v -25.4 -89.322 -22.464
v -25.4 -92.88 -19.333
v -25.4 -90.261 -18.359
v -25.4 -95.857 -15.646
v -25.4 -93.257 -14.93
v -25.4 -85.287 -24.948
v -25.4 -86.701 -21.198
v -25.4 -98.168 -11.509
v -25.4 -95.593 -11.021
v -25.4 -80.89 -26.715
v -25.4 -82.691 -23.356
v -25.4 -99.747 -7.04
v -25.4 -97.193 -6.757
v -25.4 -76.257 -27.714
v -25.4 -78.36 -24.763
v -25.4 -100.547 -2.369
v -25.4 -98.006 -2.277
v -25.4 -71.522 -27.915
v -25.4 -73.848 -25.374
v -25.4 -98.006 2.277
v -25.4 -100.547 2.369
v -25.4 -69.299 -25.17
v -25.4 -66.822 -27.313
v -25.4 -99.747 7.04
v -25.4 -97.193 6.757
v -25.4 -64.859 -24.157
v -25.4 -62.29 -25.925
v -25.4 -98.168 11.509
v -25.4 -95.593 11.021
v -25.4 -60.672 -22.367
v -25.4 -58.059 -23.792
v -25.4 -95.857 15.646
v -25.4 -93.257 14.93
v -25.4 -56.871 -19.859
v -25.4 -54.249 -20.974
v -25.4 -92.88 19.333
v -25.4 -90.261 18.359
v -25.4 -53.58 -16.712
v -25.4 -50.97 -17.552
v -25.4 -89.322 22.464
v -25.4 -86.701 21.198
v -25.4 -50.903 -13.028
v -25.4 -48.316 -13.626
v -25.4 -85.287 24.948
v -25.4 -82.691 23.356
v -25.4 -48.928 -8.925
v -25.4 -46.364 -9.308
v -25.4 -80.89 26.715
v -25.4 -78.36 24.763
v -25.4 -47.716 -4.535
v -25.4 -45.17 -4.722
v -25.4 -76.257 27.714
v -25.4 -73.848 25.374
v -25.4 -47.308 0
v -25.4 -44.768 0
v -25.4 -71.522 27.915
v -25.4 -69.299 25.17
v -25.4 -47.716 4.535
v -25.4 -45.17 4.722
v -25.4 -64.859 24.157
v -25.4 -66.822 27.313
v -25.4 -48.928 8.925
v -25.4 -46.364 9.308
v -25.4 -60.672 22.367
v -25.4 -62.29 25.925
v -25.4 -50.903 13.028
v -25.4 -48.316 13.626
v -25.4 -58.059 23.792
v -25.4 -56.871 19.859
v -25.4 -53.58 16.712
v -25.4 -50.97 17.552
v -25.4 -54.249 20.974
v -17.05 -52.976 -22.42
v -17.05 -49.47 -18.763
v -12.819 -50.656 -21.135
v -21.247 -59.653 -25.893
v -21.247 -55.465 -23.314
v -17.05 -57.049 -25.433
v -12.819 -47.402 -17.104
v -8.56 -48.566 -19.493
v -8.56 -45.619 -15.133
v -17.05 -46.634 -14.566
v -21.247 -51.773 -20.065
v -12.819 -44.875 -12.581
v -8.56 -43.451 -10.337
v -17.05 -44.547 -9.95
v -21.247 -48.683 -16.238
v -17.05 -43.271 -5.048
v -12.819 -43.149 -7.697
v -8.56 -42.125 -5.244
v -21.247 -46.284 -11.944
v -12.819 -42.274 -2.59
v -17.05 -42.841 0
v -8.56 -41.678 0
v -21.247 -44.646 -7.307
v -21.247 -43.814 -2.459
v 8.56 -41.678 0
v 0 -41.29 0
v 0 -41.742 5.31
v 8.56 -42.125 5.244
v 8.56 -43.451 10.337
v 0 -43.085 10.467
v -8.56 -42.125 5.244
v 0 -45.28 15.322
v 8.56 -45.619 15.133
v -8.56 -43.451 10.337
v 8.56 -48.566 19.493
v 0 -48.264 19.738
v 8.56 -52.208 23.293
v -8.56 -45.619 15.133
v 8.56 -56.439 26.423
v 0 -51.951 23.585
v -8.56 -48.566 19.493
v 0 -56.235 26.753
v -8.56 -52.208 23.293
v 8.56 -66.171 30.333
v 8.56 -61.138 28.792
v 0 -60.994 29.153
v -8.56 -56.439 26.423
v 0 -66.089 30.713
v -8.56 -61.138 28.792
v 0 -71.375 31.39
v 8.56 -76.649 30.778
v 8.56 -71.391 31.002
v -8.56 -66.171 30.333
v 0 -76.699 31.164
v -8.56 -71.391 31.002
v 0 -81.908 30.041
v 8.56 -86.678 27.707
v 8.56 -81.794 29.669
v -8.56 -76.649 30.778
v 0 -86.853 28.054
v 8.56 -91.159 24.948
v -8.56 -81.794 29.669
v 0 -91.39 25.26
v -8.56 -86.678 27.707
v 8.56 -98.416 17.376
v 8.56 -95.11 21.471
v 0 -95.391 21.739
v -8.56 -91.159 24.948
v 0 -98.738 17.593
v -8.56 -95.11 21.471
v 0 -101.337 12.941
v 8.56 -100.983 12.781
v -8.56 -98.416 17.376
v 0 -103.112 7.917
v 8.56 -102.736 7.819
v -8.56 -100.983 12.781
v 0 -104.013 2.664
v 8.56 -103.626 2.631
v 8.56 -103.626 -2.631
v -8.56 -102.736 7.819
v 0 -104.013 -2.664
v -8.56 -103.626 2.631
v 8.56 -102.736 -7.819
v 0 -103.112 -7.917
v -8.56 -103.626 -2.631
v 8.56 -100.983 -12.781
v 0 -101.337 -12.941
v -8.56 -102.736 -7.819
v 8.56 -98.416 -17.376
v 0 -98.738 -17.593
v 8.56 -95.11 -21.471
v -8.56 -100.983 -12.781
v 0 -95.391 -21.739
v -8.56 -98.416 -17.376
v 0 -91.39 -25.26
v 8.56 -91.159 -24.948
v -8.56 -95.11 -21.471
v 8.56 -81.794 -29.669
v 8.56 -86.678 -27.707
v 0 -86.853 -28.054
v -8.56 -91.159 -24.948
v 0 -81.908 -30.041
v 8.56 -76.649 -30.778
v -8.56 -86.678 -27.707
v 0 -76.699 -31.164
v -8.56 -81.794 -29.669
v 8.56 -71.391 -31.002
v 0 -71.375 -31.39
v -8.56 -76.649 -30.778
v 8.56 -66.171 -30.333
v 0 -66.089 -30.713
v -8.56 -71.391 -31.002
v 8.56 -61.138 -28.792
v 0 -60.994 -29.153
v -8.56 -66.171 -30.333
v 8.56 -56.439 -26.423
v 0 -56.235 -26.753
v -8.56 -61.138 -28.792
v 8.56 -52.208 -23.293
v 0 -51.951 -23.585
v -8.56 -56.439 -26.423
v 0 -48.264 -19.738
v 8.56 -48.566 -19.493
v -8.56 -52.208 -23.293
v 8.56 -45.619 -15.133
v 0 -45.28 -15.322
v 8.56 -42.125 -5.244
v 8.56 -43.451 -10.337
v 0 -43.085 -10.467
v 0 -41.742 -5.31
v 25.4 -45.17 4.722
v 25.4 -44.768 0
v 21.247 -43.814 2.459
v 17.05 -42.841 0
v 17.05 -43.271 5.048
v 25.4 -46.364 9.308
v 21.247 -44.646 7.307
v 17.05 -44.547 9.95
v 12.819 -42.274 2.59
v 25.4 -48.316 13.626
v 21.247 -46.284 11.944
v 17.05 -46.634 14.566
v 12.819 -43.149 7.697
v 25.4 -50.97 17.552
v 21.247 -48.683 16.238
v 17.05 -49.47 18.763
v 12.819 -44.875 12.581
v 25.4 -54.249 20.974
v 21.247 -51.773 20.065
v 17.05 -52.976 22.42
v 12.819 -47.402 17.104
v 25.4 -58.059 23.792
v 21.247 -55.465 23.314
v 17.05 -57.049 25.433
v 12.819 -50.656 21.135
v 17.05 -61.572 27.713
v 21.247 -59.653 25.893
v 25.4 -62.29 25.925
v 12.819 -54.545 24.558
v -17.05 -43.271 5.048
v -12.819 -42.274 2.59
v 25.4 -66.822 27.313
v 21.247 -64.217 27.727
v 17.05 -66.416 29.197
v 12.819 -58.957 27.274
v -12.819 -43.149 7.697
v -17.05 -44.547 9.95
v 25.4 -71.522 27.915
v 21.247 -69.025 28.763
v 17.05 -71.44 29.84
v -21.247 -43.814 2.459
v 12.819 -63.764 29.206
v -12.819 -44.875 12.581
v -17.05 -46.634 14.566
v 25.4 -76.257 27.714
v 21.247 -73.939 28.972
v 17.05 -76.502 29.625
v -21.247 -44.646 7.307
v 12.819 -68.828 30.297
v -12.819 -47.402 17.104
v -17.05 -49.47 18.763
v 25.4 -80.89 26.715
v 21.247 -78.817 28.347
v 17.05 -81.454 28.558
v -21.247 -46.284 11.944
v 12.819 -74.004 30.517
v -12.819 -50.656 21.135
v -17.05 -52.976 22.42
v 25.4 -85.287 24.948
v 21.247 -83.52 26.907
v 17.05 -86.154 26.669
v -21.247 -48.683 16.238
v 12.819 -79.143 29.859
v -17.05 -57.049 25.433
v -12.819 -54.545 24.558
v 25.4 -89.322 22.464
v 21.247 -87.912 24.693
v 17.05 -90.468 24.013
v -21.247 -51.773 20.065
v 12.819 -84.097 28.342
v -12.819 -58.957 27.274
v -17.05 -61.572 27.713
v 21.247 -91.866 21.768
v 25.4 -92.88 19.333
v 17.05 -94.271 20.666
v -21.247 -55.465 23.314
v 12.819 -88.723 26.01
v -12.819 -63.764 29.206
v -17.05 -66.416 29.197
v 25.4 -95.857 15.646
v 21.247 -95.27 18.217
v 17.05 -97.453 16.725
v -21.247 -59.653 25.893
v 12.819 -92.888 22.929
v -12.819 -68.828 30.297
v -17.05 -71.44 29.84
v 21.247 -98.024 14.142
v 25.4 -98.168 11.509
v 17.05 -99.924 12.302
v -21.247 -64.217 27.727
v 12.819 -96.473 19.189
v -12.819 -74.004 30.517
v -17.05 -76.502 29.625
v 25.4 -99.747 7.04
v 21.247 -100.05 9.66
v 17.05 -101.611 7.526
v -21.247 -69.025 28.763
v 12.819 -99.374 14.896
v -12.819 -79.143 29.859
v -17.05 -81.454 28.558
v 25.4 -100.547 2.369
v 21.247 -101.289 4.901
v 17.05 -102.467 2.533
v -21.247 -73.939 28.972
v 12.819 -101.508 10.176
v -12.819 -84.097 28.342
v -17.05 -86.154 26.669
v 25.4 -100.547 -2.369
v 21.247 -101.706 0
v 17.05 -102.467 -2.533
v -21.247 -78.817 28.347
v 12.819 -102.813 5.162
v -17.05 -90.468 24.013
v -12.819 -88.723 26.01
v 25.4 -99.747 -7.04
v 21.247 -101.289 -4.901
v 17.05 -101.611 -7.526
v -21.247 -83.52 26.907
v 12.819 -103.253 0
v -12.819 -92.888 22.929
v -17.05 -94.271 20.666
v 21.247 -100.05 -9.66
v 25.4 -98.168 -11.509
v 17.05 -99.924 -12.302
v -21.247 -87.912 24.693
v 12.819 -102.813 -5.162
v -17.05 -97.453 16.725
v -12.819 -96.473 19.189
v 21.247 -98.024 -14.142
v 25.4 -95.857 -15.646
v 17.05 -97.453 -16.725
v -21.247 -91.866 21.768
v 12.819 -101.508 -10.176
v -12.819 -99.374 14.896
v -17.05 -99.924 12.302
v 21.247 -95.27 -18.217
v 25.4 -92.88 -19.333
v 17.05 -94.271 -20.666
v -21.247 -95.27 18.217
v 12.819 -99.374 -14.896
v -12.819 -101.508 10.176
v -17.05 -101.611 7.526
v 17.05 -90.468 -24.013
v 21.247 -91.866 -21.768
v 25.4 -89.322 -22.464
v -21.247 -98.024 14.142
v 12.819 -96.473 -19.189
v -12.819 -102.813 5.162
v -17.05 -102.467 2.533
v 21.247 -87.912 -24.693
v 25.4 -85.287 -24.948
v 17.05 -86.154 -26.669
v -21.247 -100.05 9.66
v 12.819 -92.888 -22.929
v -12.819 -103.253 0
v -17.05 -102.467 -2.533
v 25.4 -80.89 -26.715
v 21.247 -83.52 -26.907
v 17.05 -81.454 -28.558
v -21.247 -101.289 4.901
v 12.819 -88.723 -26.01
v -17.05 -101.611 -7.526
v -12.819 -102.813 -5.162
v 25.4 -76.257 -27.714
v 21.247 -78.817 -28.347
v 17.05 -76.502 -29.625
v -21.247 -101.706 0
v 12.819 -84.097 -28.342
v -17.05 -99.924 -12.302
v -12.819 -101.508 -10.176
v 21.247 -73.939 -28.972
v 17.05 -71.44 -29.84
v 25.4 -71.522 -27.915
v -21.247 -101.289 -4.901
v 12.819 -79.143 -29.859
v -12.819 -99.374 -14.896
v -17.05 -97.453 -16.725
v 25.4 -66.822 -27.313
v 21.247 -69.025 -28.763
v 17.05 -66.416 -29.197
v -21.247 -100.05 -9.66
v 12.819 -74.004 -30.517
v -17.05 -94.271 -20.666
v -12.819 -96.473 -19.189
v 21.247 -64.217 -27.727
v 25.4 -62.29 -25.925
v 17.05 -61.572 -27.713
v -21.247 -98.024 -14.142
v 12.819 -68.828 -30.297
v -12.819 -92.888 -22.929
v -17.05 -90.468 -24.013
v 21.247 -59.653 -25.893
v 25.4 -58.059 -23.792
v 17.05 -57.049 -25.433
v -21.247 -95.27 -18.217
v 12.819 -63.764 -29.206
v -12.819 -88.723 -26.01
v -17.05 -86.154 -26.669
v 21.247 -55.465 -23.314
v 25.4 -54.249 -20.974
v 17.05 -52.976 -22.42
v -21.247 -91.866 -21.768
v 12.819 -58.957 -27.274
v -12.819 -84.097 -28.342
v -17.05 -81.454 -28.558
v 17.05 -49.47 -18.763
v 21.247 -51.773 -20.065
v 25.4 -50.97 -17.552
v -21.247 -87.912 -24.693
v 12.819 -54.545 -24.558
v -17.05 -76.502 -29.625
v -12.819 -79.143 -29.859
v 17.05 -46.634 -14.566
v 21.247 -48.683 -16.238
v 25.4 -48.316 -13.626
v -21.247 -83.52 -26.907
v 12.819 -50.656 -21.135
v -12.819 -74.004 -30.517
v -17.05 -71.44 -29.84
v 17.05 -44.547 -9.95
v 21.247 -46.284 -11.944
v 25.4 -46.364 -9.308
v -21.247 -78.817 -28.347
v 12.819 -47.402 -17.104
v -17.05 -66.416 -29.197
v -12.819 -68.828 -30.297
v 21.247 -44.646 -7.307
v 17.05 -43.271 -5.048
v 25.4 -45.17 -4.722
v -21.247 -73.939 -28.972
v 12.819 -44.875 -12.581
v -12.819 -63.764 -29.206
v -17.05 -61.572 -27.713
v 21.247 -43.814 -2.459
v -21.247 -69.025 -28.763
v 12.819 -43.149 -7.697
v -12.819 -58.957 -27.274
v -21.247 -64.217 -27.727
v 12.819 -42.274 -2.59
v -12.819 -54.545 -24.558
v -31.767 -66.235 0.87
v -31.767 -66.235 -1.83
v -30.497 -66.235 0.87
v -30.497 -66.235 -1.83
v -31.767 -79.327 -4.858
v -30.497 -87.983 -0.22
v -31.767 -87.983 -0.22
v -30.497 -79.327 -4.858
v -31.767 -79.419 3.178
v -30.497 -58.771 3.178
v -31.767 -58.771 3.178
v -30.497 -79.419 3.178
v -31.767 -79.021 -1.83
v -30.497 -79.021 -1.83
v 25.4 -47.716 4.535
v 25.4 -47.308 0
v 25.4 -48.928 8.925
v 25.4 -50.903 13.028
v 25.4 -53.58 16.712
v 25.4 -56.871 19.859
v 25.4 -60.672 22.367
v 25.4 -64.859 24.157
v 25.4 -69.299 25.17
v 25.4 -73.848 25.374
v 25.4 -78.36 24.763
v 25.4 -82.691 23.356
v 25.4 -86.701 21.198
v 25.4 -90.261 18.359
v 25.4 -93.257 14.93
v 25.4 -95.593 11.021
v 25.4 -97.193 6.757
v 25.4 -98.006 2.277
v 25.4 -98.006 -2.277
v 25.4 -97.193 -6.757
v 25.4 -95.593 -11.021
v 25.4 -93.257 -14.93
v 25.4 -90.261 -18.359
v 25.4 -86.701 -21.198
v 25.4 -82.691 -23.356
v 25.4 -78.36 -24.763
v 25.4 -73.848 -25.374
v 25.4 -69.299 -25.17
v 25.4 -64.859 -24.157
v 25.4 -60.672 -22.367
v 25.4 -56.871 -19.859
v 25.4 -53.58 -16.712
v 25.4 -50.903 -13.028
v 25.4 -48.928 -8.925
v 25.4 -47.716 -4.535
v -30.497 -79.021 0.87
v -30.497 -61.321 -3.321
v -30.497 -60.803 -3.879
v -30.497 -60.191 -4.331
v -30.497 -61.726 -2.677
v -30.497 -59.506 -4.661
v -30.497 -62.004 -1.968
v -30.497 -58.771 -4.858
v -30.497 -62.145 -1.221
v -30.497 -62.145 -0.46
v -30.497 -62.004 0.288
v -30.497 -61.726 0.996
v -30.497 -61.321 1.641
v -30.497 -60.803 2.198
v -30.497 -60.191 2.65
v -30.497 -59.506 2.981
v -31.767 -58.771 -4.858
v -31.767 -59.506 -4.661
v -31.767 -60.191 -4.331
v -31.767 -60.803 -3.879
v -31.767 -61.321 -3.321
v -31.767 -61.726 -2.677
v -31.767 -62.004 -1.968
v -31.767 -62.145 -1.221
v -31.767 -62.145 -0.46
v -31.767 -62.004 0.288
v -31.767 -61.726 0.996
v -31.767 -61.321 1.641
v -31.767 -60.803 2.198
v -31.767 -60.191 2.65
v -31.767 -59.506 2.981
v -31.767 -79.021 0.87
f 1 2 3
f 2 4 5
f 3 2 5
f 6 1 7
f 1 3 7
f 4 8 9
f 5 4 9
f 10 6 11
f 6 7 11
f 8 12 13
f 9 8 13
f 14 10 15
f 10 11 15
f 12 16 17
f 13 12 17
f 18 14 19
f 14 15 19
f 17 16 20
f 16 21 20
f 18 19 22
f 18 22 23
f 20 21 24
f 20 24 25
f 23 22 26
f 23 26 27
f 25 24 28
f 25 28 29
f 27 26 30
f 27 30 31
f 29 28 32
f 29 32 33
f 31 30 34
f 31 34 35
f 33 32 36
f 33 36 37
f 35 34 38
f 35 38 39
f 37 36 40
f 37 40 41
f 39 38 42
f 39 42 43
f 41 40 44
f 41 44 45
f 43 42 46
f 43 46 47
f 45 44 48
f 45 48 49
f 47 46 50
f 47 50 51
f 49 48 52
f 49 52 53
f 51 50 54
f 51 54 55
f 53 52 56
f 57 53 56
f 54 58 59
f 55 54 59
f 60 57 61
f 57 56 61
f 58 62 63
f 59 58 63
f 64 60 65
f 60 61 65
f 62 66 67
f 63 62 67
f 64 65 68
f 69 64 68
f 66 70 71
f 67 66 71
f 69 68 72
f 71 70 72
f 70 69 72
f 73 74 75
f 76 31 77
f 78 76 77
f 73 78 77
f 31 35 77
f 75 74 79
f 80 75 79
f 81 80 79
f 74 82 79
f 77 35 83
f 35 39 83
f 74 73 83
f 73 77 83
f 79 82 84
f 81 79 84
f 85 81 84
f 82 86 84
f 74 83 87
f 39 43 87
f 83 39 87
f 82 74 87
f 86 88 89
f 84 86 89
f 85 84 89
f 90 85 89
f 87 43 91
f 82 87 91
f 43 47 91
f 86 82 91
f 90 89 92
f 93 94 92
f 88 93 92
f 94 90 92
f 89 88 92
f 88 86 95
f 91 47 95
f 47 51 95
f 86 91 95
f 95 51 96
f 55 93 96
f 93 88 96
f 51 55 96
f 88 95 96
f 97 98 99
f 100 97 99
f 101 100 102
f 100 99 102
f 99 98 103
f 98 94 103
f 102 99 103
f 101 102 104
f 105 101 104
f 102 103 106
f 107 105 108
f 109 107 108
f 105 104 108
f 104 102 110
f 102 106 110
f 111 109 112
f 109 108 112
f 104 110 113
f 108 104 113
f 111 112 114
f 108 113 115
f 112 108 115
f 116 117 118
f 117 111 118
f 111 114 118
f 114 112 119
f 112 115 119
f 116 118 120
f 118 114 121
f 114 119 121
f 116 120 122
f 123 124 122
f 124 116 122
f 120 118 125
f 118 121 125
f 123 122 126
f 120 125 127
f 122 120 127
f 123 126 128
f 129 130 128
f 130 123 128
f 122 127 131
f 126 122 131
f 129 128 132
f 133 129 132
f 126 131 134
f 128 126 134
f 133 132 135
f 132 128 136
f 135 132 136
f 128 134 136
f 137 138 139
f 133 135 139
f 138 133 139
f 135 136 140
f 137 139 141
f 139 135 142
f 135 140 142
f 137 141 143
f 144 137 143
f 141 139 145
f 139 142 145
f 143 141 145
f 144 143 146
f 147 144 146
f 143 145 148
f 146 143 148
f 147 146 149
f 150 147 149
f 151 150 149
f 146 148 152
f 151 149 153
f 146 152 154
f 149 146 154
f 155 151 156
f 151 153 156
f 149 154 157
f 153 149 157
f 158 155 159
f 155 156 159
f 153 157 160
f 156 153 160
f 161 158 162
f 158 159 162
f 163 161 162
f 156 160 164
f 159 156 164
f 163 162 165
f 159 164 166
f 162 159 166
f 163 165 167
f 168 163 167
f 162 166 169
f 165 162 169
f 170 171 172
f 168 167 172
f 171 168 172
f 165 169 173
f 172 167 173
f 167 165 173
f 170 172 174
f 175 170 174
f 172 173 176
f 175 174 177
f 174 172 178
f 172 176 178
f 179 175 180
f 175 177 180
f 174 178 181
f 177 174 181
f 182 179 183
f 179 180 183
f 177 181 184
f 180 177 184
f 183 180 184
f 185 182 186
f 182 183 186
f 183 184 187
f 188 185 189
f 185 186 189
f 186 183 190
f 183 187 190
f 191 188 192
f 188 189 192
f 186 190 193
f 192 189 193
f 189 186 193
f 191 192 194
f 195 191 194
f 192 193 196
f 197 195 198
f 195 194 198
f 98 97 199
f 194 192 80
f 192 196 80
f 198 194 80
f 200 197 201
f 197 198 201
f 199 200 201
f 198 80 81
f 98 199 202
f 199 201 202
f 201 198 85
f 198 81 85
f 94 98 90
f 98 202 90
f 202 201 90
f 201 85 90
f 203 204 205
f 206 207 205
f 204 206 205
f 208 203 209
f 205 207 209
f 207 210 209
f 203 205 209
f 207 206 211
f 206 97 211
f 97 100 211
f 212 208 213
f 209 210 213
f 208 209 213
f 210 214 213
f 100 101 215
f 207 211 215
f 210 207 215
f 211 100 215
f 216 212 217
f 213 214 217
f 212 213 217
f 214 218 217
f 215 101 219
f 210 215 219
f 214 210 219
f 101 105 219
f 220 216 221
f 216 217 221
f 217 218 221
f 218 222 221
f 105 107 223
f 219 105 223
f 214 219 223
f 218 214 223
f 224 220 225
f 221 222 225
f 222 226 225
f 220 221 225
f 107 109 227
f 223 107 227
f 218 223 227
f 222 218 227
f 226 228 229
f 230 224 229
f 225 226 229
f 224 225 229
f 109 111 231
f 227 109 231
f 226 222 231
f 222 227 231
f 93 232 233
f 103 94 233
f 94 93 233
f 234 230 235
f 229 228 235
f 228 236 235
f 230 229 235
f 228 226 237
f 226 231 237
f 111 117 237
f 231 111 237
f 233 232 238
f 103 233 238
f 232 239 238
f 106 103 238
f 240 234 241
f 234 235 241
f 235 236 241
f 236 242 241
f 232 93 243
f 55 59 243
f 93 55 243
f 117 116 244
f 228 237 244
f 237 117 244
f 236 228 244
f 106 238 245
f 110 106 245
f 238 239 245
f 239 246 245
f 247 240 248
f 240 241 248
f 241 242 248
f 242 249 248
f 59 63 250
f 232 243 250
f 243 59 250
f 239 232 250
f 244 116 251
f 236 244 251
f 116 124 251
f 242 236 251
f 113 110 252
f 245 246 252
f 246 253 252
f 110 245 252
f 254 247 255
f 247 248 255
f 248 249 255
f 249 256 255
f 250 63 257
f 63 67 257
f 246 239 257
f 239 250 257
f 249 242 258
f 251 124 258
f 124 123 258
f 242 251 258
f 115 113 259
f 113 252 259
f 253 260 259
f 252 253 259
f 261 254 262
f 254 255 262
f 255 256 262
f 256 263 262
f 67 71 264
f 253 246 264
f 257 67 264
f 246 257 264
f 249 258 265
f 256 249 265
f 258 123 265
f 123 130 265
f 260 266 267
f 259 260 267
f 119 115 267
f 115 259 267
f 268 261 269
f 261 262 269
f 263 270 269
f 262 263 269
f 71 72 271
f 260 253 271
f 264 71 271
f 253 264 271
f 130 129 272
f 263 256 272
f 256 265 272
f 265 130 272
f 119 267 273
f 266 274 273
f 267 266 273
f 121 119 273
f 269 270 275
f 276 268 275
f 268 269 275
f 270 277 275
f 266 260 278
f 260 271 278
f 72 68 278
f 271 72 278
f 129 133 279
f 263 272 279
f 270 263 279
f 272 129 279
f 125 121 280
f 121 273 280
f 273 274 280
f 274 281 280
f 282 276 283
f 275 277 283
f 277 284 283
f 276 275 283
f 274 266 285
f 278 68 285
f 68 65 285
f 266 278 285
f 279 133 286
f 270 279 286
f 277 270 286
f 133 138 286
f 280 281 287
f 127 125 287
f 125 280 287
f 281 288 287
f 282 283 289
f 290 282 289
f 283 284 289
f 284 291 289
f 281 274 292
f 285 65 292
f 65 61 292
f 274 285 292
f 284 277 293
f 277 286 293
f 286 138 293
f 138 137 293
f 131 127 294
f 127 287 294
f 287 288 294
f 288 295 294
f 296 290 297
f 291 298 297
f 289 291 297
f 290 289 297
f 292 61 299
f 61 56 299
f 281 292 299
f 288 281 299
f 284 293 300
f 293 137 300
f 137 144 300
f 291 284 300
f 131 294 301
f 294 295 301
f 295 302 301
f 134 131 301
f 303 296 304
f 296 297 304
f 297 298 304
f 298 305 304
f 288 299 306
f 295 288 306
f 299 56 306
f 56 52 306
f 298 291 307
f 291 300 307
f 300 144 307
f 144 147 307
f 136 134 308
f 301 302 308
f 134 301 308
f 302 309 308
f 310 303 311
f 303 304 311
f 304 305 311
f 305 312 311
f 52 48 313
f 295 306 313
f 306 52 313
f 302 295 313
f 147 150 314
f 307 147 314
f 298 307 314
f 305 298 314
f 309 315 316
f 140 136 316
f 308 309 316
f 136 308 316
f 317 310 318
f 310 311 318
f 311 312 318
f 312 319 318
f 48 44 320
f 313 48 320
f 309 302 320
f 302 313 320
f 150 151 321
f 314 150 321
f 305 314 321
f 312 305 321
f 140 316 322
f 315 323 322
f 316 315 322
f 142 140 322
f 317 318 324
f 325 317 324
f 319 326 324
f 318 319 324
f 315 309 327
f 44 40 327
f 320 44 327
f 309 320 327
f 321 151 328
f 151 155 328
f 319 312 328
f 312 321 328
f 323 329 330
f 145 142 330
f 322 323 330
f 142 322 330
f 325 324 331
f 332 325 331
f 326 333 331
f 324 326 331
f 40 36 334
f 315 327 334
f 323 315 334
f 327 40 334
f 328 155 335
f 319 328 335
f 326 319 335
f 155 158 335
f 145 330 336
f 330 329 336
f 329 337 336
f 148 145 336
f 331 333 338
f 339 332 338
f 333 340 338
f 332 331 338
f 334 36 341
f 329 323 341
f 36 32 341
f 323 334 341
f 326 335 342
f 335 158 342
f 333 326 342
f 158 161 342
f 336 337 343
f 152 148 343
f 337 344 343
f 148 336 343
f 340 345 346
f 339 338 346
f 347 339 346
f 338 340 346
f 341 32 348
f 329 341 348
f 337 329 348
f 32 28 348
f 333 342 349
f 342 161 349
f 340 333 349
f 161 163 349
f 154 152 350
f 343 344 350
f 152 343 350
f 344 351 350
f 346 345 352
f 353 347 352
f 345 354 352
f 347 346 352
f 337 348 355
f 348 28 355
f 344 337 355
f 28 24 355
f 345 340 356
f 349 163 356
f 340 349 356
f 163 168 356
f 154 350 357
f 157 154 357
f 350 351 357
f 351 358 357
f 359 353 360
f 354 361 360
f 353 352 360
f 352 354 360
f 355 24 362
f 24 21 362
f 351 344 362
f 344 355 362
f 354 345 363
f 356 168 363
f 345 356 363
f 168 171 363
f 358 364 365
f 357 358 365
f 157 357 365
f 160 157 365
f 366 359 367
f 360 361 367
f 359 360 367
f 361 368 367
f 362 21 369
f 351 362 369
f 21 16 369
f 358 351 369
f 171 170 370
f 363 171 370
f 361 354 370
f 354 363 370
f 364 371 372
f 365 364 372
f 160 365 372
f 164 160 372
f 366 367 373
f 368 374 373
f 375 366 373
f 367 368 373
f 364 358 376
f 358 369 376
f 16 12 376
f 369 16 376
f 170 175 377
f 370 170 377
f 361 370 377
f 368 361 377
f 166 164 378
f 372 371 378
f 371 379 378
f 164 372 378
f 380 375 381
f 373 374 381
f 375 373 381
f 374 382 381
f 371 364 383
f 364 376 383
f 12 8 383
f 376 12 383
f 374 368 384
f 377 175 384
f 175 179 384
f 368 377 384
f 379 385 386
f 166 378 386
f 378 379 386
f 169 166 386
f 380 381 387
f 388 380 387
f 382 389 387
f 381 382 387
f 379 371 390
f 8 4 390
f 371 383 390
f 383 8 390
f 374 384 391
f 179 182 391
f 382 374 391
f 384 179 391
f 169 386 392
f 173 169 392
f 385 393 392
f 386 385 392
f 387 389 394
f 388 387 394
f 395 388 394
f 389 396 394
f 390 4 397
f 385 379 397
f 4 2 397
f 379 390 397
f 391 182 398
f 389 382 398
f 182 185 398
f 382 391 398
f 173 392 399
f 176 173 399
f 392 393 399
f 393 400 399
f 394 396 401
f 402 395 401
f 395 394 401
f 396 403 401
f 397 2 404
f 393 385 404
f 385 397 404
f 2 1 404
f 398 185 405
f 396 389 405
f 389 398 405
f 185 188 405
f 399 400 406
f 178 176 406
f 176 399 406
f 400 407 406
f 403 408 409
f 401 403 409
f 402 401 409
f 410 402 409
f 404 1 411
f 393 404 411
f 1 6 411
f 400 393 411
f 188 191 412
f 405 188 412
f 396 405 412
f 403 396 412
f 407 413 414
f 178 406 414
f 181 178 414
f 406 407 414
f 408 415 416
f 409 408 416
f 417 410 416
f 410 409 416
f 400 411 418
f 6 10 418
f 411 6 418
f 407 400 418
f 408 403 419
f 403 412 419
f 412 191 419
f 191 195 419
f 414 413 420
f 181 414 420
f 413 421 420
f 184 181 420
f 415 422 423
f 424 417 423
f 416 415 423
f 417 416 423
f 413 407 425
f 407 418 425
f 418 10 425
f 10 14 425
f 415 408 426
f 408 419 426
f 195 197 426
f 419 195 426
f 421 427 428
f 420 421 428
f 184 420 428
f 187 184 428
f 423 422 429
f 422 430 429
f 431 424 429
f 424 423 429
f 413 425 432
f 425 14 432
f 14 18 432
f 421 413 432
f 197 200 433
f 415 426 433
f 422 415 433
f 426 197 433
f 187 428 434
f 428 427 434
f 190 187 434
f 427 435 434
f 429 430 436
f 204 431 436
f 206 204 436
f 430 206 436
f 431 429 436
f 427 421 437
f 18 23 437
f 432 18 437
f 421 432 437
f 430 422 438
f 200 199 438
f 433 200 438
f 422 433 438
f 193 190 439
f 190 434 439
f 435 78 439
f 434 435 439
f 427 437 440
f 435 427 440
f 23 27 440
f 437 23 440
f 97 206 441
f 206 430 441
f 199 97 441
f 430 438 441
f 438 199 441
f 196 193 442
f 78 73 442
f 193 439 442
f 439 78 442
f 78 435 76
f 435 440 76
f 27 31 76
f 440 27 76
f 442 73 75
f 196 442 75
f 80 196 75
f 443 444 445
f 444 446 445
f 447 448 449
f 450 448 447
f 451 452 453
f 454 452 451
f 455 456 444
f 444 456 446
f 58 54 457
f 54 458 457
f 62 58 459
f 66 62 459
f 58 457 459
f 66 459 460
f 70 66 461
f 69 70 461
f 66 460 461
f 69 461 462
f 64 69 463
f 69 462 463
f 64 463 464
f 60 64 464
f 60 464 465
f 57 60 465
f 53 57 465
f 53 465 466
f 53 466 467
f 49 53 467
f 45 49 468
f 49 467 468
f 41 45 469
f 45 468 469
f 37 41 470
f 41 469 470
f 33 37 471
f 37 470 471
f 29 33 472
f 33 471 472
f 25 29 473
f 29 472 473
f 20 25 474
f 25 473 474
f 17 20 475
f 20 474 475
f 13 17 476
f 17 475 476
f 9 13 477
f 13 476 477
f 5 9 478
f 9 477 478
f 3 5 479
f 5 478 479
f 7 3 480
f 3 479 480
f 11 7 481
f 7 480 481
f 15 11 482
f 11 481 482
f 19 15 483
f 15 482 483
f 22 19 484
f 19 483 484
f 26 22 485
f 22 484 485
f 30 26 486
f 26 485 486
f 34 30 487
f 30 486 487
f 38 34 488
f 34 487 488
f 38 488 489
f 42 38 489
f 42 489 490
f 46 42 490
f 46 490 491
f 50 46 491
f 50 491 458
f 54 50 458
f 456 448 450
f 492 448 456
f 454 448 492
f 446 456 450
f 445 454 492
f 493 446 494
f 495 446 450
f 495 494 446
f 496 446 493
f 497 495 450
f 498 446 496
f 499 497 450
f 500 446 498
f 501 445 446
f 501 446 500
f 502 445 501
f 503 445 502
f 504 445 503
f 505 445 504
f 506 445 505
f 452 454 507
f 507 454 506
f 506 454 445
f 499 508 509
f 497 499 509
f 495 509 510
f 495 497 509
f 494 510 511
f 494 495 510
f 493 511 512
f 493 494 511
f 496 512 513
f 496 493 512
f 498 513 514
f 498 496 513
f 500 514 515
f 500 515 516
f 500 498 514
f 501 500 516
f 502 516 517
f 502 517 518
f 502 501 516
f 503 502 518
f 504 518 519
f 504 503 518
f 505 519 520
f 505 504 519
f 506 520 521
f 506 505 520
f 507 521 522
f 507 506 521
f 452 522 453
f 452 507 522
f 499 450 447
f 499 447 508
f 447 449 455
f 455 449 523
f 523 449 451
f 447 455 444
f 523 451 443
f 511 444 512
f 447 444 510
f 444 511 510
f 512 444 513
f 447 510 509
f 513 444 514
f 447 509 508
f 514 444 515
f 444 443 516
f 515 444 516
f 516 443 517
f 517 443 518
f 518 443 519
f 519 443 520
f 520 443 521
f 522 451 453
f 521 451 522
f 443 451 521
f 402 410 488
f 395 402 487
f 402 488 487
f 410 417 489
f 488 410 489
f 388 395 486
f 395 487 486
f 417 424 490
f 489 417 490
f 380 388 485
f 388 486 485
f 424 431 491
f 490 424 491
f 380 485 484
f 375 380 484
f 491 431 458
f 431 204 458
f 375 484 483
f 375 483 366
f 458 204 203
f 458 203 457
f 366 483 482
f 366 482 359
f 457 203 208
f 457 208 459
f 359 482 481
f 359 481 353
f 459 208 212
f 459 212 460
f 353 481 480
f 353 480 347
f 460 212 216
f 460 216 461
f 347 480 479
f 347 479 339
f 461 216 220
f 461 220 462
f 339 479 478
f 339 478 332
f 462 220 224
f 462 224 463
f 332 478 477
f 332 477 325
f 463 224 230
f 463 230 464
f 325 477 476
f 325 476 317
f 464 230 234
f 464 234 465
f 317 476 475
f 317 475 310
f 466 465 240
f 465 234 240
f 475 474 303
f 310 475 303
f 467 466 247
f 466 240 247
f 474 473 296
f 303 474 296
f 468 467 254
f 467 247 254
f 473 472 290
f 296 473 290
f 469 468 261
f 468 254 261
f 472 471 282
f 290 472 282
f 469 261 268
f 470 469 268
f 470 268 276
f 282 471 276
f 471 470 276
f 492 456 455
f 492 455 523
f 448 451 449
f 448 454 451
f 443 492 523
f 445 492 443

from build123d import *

# Parameters (mm, degrees)
F13_W          = 12.7856880426
F13_H          = 2.7000820846
F14_DEPTH      = 0.635
F14_DEPTH_BACK = 0.635


# Not quite as in the source:
# - a feature of the source that left no trace in its solid (it failed there, or was rolled back) is left out
# - the program builds the solid bodies; features that only make, move or delete a surface that nothing else refers to are left out


with BuildPart() as f3:
    # F2 (on plane+point) → F3 (revolve)
    with BuildSketch(Plane.XY):
        with BuildLine():
            Line((-25.4, -44.7680812202), (-25.4, -47.3080812202))
            Line((-25.4, -47.3080812202), (25.4, -47.3080812202))
            Line((25.4, -47.3080812202), (25.4, -44.7680812202))
            ThreePointArc((25.4, -44.7680812202), (0, -41.2899077912), (-25.4, -44.7680812202))
        make_face()
    revolve(axis=Axis((0, -72.7080783897, 0), (1, 0, 0)))


with BuildPart() as f14:
    # F13 (on line) → F14 (new body, two sides)
    with BuildSketch(Plane.YZ.offset(-31.1320461684)) as f14_sk:
        with BuildLine():
            Line((-79.4192776084, 3.1777741387), (-87.9828110337, -0.2195611014))
            Line((-87.9828110337, -0.2195611014), (-79.3269872665, -4.8583555035))
            Line((-79.3269872665, -4.8583555035), (-58.7705560029, -4.8583555035))
            ThreePointArc((-58.7705560029, -4.8583555035), (-62.1628887785, -0.8402906824), (-58.7705560029, 3.1777741387))
            Line((-58.7705560029, 3.1777741387), (-79.4192776084, 3.1777741387))
        make_face()
        with Locations((-72.628326714, -0.4799846502)):
            Rectangle(F13_W, F13_H, mode=Mode.SUBTRACT)
    extrude(amount=F14_DEPTH)
    extrude(f14_sk.sketch, amount=-F14_DEPTH_BACK)


solid = Compound([f3.part, f14.part])
